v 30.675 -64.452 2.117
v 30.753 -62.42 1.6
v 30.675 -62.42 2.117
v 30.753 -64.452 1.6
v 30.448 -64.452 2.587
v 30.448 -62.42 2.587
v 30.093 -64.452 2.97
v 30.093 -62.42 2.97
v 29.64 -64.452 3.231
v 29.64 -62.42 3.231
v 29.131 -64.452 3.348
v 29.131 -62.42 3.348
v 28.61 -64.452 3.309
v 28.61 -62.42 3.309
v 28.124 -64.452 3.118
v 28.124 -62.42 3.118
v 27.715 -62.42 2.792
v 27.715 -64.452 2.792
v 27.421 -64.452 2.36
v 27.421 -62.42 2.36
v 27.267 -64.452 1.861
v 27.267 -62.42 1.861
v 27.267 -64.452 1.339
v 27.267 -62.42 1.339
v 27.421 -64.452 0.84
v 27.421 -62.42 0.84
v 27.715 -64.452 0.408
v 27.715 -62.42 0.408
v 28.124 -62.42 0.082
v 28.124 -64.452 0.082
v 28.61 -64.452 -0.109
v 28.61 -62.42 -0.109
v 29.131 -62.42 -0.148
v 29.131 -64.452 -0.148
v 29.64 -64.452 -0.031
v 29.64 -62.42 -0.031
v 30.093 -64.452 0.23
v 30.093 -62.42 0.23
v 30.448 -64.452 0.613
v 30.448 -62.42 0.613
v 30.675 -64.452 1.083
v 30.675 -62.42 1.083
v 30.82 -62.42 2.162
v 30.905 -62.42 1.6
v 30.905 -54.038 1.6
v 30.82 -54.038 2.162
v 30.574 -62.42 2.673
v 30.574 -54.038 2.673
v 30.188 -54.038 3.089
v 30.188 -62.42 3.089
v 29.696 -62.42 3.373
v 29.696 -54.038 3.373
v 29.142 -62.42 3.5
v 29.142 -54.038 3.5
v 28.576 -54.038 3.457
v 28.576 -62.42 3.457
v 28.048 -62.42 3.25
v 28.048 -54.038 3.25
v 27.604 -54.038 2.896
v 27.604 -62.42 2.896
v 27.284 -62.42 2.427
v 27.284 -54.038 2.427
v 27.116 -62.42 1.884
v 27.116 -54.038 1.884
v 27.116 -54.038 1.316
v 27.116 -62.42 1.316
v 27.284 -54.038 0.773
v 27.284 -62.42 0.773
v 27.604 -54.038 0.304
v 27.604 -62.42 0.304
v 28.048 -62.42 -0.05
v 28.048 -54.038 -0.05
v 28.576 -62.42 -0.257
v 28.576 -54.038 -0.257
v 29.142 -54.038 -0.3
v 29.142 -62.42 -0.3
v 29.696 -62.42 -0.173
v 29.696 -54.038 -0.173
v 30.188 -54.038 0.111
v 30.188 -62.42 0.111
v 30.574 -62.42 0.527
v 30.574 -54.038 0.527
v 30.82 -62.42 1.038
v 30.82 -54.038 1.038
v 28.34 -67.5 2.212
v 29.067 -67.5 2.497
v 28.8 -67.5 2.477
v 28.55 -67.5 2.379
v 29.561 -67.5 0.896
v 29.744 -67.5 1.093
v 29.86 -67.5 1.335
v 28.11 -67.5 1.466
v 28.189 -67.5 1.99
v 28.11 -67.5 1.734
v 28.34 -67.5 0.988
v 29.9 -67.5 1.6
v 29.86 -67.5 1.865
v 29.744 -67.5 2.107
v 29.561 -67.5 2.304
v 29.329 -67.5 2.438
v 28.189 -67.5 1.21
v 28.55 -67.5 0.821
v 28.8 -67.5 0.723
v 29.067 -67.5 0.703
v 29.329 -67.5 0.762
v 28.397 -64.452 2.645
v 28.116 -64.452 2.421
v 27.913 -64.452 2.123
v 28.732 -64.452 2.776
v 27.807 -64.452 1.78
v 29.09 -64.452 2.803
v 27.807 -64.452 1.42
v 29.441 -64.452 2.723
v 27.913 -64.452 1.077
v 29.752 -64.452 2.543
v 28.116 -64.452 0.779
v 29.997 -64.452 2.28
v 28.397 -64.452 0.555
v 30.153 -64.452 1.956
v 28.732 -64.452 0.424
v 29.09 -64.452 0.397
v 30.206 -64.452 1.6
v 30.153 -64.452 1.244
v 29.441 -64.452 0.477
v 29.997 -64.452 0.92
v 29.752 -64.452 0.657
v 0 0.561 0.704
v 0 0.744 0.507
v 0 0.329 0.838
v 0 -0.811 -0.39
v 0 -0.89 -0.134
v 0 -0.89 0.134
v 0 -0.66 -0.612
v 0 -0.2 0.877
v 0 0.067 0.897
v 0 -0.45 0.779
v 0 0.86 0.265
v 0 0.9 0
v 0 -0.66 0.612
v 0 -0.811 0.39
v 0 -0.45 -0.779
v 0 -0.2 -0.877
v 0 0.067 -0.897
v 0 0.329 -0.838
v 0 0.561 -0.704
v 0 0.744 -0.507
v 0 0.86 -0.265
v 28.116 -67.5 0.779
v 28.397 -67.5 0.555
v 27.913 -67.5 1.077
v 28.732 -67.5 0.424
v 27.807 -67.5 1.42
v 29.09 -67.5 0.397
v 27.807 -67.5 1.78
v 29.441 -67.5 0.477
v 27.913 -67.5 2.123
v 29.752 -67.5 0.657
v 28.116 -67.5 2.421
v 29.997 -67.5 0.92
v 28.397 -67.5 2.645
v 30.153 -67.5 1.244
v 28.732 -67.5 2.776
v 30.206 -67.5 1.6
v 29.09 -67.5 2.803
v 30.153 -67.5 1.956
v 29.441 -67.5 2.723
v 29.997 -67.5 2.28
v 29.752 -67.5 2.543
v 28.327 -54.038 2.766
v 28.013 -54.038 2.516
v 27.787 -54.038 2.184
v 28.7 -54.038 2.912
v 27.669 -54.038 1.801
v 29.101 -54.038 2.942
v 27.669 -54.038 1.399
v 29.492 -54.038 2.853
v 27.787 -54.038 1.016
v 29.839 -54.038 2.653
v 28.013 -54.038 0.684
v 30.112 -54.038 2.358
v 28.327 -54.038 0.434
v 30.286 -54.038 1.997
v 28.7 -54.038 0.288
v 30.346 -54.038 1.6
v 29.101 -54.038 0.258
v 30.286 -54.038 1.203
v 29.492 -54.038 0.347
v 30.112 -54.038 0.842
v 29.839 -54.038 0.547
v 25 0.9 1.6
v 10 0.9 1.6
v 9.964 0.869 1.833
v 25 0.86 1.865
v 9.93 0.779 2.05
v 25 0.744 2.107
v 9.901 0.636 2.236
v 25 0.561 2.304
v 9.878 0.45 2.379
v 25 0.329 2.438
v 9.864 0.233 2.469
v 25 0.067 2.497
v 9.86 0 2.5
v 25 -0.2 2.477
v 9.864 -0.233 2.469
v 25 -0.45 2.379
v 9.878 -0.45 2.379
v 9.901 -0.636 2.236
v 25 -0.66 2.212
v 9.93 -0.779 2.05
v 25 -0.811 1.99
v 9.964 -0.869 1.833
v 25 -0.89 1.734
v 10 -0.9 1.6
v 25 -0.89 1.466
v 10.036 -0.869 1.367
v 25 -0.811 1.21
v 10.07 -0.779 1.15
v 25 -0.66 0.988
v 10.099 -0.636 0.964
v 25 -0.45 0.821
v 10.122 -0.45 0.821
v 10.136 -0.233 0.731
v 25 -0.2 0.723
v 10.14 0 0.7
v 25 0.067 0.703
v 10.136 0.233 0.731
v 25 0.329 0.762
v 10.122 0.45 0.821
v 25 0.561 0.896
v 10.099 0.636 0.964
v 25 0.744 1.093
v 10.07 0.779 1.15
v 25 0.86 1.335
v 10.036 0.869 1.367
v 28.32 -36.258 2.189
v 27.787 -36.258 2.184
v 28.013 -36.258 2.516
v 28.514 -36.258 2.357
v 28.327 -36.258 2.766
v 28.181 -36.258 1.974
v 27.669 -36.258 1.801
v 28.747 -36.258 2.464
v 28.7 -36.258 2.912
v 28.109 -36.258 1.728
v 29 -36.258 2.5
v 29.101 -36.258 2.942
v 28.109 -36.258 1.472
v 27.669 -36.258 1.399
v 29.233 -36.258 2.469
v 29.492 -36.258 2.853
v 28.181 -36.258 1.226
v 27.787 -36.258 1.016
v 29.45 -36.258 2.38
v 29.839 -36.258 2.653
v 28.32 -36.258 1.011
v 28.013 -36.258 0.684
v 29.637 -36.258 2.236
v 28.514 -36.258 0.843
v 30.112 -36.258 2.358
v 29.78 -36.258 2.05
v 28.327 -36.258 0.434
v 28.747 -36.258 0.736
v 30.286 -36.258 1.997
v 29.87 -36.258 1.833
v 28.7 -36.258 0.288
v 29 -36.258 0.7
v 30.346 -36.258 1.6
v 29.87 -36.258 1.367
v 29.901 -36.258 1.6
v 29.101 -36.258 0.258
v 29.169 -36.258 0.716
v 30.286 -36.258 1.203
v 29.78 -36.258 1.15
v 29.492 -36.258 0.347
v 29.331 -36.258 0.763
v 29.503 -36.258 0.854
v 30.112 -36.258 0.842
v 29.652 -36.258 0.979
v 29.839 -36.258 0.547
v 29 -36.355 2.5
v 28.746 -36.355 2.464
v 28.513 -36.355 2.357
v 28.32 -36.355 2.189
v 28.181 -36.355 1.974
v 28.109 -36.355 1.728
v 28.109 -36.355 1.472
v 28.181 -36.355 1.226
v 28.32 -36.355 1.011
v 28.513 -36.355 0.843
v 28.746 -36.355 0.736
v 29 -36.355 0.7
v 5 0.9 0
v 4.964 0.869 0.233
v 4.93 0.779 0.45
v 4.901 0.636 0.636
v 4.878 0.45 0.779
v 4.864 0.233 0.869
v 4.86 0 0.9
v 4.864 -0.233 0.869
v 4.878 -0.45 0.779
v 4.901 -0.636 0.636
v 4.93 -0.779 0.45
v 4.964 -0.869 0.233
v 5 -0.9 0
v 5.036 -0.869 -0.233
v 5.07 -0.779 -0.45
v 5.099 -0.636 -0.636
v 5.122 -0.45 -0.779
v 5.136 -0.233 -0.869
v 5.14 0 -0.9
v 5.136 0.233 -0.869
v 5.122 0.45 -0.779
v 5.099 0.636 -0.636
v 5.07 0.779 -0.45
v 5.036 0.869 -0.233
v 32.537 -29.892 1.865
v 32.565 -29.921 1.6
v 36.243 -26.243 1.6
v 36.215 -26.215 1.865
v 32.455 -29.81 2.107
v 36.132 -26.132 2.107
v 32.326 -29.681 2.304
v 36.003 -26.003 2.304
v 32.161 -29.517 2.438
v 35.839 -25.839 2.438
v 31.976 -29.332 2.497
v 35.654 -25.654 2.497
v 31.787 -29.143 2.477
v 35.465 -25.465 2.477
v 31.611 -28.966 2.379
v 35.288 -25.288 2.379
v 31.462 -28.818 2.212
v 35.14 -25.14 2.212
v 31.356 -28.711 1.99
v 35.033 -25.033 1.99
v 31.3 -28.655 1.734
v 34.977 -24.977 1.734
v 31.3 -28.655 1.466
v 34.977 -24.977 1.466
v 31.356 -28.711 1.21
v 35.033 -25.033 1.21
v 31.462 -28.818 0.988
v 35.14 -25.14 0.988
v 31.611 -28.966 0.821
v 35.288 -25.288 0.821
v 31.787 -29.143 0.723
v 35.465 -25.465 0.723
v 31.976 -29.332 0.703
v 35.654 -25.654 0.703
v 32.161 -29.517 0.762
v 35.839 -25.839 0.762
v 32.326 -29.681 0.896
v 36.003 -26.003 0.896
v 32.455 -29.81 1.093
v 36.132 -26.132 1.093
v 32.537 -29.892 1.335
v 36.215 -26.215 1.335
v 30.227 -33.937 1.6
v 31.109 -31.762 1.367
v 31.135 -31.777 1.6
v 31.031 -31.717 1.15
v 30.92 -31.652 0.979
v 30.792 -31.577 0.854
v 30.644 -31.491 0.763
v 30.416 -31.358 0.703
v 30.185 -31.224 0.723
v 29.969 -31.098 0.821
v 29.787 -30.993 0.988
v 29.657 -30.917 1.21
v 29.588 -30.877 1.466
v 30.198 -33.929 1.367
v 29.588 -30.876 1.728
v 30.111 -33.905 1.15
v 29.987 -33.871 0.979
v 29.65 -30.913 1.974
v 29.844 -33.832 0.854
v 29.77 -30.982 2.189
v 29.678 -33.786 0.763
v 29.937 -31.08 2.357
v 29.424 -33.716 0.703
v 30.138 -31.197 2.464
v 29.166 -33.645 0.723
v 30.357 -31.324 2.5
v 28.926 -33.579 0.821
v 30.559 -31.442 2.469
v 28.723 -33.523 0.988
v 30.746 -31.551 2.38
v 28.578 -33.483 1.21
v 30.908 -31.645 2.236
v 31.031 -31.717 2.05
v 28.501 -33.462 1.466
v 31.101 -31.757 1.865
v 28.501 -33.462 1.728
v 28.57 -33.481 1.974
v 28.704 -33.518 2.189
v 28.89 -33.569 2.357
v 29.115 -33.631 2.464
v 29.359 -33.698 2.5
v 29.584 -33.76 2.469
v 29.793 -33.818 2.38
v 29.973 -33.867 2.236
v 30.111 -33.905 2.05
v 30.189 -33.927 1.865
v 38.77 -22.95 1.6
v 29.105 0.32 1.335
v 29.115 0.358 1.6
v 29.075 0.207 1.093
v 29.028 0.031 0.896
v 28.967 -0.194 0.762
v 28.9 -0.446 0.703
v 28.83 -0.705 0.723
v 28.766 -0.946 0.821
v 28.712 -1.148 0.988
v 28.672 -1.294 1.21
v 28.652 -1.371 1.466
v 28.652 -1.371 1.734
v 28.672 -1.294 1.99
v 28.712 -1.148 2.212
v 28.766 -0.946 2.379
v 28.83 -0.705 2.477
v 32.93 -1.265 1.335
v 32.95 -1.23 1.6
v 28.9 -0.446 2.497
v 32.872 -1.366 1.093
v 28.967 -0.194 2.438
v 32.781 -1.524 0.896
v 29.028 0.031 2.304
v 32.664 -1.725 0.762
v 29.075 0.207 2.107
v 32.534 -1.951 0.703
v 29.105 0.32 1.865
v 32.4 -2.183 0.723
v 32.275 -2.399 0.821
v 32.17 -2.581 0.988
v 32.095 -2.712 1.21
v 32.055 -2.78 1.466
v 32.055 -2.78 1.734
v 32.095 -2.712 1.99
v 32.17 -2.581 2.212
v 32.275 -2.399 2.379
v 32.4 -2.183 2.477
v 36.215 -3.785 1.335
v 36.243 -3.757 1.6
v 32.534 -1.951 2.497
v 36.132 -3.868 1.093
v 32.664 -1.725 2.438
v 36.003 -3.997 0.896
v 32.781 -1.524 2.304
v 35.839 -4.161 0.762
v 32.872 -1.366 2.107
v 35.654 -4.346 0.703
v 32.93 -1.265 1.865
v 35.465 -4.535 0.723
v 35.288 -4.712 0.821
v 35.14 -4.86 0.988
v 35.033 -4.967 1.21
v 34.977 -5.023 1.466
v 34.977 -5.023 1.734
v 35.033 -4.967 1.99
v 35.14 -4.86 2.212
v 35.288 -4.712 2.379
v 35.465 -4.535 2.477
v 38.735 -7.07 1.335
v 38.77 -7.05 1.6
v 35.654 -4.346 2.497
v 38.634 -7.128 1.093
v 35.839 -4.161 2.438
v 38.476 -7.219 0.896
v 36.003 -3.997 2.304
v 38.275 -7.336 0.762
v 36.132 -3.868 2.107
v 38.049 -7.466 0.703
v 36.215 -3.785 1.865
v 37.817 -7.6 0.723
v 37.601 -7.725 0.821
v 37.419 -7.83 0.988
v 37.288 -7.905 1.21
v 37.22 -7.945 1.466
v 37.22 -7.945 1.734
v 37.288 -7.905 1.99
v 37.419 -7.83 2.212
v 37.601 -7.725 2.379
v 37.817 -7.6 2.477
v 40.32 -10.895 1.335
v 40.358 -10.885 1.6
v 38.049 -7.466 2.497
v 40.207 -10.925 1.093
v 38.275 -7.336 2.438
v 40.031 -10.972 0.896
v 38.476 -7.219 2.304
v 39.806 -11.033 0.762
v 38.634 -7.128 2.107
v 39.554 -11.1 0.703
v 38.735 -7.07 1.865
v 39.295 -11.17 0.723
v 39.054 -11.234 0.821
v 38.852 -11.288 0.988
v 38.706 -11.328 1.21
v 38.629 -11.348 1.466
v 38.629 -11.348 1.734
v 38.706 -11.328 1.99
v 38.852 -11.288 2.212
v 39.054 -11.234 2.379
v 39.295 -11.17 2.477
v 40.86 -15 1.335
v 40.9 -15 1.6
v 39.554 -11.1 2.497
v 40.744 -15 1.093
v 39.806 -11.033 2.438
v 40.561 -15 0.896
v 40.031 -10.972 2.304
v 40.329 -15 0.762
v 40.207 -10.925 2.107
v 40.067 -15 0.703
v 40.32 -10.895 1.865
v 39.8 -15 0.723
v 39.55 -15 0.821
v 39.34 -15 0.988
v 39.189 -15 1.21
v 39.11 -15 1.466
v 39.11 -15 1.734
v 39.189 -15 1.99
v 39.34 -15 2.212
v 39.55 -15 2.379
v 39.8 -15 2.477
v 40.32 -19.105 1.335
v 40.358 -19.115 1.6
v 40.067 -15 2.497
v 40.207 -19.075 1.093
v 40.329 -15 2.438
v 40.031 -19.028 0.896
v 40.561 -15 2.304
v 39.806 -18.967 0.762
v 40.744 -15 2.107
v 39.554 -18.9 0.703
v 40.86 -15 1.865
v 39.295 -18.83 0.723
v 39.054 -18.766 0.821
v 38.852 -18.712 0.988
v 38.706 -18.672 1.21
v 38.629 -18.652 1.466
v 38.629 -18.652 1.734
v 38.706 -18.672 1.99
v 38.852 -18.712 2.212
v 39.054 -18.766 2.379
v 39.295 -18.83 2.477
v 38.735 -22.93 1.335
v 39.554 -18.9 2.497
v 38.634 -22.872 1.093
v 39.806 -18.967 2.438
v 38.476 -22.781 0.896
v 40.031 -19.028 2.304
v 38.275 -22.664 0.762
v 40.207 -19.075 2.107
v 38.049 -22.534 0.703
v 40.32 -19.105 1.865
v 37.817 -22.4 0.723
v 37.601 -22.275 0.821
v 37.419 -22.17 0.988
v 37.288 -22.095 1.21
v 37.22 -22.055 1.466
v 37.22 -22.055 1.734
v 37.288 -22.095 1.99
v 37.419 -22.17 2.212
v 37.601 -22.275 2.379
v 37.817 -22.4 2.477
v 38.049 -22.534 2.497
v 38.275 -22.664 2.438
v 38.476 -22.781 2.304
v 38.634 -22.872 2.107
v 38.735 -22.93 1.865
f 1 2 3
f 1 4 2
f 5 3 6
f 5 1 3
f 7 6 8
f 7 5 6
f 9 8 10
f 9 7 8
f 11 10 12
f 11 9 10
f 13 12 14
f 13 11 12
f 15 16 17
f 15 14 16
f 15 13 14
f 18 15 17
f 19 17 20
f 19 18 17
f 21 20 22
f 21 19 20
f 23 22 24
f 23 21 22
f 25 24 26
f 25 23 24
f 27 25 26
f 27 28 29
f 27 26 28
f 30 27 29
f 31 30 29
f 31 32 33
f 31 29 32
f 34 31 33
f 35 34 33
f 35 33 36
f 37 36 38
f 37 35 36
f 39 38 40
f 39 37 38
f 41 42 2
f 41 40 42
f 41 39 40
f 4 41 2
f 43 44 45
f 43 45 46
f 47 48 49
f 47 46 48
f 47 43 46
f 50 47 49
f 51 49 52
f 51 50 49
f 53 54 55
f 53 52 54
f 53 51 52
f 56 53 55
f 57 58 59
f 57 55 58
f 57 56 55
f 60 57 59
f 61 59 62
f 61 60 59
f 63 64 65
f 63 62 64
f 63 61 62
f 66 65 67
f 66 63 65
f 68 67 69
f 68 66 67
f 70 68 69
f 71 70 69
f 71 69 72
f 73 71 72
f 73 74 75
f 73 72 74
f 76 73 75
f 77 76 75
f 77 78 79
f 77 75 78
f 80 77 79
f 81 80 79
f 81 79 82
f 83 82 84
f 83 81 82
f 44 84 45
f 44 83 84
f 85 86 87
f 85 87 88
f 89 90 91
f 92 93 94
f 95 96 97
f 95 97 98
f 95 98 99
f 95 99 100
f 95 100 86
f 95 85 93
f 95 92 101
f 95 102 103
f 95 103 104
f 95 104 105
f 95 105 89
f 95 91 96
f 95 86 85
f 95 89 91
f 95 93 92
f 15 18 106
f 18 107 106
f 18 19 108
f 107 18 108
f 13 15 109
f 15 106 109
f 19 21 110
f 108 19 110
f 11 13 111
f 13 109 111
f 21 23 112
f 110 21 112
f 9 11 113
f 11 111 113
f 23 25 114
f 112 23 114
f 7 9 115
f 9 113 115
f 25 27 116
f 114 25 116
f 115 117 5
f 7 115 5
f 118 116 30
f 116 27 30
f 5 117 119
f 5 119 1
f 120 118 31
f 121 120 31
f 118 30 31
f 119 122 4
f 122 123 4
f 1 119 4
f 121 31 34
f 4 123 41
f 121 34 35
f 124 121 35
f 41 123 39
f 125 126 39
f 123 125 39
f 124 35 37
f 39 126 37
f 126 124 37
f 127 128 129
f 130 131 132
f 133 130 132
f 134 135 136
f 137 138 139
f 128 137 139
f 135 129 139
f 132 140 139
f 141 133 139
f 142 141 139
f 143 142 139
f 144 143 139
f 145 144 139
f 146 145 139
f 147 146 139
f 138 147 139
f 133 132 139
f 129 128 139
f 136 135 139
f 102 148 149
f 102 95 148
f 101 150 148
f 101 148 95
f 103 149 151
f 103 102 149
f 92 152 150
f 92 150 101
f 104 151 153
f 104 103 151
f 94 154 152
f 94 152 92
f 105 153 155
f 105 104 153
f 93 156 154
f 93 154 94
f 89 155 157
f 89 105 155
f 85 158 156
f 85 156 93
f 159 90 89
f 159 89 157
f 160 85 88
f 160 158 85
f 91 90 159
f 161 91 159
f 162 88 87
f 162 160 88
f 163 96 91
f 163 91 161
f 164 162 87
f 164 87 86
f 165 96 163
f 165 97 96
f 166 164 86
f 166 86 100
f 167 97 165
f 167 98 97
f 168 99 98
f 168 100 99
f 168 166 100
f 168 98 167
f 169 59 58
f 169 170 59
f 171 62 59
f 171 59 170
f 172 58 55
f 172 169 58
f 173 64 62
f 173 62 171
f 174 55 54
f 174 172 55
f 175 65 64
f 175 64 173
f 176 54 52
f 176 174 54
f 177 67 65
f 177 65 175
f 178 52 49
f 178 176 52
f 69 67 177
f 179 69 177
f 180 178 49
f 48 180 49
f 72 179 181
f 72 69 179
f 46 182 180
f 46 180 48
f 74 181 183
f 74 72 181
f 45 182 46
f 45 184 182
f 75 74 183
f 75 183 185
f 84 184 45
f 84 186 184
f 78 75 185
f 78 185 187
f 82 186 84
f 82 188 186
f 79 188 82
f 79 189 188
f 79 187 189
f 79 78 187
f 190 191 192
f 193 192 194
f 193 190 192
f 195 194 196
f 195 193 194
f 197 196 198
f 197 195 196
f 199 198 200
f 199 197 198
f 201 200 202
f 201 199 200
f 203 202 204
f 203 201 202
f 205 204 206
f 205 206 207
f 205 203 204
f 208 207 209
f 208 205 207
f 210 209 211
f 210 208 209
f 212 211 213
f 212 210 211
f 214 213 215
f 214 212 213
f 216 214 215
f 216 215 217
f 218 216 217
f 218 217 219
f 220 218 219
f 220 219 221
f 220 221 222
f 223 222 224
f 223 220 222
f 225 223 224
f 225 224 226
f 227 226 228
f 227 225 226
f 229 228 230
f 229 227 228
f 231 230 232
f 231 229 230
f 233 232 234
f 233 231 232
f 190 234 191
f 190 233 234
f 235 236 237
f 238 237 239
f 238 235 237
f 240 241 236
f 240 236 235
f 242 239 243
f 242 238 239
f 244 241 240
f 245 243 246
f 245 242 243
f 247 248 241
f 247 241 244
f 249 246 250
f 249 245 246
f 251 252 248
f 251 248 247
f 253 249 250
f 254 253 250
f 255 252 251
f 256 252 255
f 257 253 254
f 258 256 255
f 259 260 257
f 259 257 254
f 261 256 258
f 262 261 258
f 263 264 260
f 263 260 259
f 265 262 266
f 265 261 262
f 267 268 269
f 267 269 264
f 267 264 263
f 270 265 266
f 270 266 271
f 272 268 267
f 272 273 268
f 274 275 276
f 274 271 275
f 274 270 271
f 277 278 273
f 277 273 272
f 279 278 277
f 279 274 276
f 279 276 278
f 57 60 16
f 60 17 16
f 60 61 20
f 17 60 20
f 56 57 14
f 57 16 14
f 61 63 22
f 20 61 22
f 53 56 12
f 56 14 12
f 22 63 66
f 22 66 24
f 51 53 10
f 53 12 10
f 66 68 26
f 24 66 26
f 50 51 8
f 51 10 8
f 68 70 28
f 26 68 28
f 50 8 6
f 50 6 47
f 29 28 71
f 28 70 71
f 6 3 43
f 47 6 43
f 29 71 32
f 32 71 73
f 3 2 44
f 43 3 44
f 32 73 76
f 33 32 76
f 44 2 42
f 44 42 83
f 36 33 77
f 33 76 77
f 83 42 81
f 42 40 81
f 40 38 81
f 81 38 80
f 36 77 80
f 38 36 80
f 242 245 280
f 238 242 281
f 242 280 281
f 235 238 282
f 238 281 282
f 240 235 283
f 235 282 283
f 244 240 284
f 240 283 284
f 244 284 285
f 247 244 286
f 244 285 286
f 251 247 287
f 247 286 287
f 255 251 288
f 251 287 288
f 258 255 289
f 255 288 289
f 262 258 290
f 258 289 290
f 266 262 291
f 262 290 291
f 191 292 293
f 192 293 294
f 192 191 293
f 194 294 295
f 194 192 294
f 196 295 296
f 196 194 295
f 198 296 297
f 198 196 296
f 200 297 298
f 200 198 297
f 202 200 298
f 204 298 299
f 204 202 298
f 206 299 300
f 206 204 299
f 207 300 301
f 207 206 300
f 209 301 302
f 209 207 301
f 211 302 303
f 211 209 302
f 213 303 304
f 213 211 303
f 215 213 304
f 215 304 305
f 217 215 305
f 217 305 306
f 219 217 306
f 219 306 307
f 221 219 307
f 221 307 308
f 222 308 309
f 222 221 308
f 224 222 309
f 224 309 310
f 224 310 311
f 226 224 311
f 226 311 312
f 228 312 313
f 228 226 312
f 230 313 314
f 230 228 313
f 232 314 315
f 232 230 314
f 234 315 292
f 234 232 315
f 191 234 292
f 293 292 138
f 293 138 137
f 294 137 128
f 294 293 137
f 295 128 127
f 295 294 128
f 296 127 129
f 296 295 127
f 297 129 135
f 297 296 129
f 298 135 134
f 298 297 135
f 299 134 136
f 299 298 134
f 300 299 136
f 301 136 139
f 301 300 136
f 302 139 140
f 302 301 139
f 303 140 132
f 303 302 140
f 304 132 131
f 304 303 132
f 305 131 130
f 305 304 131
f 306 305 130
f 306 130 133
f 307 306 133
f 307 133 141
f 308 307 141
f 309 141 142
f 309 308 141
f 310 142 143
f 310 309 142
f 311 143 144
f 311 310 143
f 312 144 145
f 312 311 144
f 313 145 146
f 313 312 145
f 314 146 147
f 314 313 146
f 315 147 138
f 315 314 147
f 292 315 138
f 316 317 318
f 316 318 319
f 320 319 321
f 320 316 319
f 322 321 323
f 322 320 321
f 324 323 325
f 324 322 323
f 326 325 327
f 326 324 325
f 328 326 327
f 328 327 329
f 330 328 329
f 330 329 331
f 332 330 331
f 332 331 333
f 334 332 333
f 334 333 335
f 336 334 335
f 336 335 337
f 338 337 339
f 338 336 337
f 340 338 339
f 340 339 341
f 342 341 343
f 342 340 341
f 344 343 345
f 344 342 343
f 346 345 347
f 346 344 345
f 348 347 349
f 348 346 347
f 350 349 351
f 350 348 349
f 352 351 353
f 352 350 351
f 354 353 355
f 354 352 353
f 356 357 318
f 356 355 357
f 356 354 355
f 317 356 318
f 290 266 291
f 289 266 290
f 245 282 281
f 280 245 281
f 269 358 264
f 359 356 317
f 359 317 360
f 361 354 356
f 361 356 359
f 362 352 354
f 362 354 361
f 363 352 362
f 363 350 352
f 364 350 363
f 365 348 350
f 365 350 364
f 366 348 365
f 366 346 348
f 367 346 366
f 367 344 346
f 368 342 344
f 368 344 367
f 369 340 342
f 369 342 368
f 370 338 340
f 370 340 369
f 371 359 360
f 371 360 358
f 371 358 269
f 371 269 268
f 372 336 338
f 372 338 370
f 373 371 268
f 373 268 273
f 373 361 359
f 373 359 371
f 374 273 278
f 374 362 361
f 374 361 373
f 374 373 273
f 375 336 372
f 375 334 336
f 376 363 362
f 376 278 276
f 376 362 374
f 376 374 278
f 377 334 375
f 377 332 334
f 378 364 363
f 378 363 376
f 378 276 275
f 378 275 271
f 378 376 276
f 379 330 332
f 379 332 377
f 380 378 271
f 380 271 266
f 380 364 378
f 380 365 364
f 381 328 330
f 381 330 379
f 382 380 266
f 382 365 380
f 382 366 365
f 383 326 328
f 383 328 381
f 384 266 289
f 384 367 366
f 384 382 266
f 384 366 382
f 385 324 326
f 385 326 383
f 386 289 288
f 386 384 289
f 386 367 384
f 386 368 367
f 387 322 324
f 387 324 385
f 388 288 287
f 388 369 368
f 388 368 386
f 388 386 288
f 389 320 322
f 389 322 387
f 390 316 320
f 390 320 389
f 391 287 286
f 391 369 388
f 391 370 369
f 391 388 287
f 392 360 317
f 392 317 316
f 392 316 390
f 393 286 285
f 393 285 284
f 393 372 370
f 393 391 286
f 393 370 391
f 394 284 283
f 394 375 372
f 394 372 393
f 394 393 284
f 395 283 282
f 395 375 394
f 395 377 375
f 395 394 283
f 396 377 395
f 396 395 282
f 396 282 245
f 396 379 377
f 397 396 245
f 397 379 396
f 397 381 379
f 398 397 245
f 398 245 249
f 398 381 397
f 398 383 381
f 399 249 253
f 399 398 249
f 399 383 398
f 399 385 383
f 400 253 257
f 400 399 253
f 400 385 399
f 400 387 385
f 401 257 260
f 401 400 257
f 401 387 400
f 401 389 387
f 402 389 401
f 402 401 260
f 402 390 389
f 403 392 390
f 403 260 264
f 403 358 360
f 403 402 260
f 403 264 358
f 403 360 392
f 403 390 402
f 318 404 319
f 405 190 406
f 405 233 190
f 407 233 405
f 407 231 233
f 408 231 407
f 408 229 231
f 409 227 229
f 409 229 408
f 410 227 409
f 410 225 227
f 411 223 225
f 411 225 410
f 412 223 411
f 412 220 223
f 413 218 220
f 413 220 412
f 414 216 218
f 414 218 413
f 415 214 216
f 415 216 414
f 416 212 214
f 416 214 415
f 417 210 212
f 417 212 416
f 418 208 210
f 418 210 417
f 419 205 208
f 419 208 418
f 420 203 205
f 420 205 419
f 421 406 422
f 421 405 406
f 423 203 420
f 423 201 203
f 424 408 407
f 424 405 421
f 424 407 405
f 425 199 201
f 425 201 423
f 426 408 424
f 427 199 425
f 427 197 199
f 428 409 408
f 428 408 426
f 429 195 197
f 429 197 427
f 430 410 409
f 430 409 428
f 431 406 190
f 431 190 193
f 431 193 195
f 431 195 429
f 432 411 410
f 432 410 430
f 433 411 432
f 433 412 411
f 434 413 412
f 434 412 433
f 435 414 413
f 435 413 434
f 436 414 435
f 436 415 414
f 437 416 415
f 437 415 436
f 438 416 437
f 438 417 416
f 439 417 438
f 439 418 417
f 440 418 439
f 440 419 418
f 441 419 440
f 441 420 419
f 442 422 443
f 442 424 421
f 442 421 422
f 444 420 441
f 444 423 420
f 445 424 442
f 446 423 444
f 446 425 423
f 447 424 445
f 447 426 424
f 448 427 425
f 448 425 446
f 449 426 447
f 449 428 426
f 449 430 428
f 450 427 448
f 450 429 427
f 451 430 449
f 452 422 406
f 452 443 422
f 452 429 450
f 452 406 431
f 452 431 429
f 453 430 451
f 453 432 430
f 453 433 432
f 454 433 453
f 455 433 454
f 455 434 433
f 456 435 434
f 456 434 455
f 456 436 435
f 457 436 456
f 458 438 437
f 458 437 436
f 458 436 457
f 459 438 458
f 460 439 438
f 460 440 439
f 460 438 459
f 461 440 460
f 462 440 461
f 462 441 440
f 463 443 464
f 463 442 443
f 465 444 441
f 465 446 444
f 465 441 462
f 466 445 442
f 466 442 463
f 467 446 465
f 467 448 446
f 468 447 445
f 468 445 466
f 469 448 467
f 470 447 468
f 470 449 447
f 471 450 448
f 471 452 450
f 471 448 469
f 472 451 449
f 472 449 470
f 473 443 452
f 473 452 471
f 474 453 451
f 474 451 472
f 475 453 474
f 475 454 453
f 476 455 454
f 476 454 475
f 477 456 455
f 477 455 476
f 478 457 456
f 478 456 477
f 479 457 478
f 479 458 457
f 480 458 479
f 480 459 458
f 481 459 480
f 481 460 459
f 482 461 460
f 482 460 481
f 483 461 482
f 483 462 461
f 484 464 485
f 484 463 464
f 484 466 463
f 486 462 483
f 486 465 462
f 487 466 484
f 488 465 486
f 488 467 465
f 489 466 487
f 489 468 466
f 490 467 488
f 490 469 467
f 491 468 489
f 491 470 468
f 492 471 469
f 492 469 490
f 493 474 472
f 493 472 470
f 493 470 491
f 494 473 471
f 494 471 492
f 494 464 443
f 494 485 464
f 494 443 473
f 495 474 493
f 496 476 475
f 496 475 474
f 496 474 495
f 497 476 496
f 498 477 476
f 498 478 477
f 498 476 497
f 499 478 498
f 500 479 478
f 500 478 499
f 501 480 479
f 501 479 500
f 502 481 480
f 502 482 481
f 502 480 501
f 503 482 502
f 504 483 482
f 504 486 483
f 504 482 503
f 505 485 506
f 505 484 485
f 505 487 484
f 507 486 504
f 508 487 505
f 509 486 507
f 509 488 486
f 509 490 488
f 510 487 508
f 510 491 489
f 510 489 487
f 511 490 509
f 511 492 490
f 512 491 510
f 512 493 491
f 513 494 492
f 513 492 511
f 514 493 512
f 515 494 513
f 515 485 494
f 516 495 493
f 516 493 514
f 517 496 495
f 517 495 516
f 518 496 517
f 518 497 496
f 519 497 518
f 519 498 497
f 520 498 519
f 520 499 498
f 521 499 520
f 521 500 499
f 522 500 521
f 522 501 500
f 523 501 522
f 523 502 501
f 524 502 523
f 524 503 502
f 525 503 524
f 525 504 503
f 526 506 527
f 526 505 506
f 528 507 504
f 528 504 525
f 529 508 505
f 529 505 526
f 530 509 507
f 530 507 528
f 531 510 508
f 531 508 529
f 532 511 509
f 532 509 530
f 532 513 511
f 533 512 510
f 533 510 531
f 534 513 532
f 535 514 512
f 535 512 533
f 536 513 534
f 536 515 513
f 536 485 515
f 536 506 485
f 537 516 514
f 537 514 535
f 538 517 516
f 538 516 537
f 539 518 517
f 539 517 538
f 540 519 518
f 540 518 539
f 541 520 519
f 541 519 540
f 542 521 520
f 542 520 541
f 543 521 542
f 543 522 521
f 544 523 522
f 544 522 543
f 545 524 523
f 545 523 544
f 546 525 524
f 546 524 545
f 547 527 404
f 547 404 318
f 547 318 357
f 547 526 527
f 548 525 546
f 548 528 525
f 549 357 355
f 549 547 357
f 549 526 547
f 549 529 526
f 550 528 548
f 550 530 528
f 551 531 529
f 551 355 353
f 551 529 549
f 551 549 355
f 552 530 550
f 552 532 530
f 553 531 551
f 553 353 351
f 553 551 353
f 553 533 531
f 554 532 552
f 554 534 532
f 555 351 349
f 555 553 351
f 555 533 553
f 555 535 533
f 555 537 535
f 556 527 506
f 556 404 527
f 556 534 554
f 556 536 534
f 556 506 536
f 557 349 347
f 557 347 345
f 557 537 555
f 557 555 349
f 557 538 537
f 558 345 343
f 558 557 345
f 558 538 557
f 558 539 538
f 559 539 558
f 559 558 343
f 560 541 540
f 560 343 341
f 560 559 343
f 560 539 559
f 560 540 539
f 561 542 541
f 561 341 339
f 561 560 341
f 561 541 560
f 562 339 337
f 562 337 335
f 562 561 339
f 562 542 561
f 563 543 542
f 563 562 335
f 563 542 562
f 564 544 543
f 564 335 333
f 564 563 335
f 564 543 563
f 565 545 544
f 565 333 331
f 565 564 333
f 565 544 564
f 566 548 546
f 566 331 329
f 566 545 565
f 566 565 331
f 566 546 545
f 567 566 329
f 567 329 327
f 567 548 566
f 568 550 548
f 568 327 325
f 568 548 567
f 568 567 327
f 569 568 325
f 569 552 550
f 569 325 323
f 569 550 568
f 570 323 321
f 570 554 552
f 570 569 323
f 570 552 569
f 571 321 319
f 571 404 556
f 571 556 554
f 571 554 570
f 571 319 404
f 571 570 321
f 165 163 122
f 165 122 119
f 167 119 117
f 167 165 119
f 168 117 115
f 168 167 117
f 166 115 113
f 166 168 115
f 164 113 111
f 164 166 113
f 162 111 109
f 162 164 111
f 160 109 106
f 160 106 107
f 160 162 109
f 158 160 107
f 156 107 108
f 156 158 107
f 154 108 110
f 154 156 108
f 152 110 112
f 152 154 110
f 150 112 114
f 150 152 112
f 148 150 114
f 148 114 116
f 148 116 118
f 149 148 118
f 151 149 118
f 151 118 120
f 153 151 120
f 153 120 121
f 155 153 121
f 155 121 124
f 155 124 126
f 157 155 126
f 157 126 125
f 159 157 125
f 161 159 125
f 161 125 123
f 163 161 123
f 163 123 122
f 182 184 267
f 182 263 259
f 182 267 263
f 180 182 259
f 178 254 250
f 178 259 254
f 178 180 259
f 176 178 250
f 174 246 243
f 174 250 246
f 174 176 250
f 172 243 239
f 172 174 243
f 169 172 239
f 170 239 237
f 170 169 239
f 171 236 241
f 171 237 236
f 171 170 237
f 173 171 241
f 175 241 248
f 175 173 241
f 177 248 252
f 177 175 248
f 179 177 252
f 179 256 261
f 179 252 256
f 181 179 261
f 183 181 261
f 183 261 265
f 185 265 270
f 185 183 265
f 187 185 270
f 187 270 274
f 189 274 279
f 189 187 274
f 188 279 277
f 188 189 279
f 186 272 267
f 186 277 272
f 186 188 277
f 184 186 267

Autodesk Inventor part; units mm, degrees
ref_plane "XZ Plane" through (0, 0, 0) normal (0, 1, 0) x (-1, 0, 0)
sketch "Sketch2" plane through (0, 0, 0) normal (0, 1, 0) x (-1, 0, 0)
  line L0 (0, 0) -> (-5, 0)
  line L1 (-5, 0) -> (-10, 1.6)
  line L2 (-10, 1.6) -> (-15, 1.6)
  dimension "d0" = 1.6
  dimension "d1" = 5
  dimension "d2" = 5
  dimension "d3" = 5
sketch "Sketch3" plane through (0, 0, 0) normal (1, 0, 0) x (0, 1, 0)
  circle A0 centre (0, 0) radius 0.9
  dimension "d4" = 1.8
sweep "Sweep1" add profiles "Sketch3" path "Sketch2"
ref_plane "Work Plane1" through (0, 0, 1.6) normal (0, 0, 1) x (1, 0, 0)
sketch "Sketch4" plane through (0, 0, 1.6) normal (0, 0, 1) x (1, 0, 0)
  line L0 (15, 0) -> (25, 0)
  line L1 (35.6066, -25.6066) -> (31.9289, -29.2843)
  line L2 (29, -36.3553) -> (29, -67.5)
  arc A0 (35.6066, -25.6066) -> (25, 0) centre (25, -15) ccw
  arc A1 (31.9289, -29.2843) -> (29, -36.3553) centre (39, -36.3553) ccw
  point P0 (0, 0)
  dimension "d7" = 15
  dimension "d8" = 15
  dimension "d9" = 10
  dimension "d10" = 10
  dimension "d11" = 45
  dimension "d13" = 14
  dimension "d14" = 67.5
ref_plane "Work Plane2" through (15, 0, 0) normal (1, 0, 0) x (0, 1, 0)
sketch "Sketch5" plane through (15, 0, 0) normal (1, 0, 0) x (0, 1, 0)
  circle A0 centre (0, 1.6) radius 0.9
  point P0 (0, 0)
  dimension "d16" = 1.6
  dimension "d17" = 1.8
sweep "Sweep2" add profiles "Sketch5" path "Sketch4"
sketch "Sketch7" plane through (29, -67.5, 1.6) normal (0, -1, 0) x (1, 0, 0)
  circle A0 centre (0, 0) radius 0.9 projected
  circle A1 centre (0, 0) radius 1.2065
  point P0 (-29, -1.6)
  dimension "d21" = 2.413
extrude "Extrusion1" add sketch "Sketch7" against normal blind 3.048
sketch "Sketch8" plane through (29, -64.452, 1.6) normal (0, 1, 0) x (1, 0, 0)
  circle A0 centre (0, 0) radius 0.9 projected
  circle A1 centre (0, 0) radius 1.2065 projected
  circle A2 centre (0, 0) radius 1.7526
  point P0 (-29, 1.6)
  dimension "d24" = 3.5052
extrude "Extrusion2" add sketch "Sketch8" along normal blind 2.032 contours A1 | A2
sketch "Sketch9" plane through (29, -62.42, 1.6) normal (0, 1, 0) x (1, 0, 0)
  circle A0 centre (0, 0) radius 0.9 projected
  circle A1 centre (0, 0) radius 1.7526 projected
  circle A2 centre (0, 0) radius 1.905
  point P0 (-29, 1.6)
  dimension "d27" = 3.81
extrude "Extrusion3" add sketch "Sketch9" along normal blind 8.382 contours A1 | A2
sketch "Sketch10" plane through (29, -54.038, 1.6) normal (0, 1, 0) x (1, 0, 0)
  circle A0 centre (0, 0) radius 0.9 projected
  circle A1 centre (0, 0) radius 1.905 projected
  circle A2 centre (0, 0) radius 1.3462
  point P0 (-29, 1.6)
  dimension "d30" = 2.6924
extrude "Extrusion4" add sketch "Sketch10" along normal blind 17.78 contours A2
properties part number "coax_tx"
